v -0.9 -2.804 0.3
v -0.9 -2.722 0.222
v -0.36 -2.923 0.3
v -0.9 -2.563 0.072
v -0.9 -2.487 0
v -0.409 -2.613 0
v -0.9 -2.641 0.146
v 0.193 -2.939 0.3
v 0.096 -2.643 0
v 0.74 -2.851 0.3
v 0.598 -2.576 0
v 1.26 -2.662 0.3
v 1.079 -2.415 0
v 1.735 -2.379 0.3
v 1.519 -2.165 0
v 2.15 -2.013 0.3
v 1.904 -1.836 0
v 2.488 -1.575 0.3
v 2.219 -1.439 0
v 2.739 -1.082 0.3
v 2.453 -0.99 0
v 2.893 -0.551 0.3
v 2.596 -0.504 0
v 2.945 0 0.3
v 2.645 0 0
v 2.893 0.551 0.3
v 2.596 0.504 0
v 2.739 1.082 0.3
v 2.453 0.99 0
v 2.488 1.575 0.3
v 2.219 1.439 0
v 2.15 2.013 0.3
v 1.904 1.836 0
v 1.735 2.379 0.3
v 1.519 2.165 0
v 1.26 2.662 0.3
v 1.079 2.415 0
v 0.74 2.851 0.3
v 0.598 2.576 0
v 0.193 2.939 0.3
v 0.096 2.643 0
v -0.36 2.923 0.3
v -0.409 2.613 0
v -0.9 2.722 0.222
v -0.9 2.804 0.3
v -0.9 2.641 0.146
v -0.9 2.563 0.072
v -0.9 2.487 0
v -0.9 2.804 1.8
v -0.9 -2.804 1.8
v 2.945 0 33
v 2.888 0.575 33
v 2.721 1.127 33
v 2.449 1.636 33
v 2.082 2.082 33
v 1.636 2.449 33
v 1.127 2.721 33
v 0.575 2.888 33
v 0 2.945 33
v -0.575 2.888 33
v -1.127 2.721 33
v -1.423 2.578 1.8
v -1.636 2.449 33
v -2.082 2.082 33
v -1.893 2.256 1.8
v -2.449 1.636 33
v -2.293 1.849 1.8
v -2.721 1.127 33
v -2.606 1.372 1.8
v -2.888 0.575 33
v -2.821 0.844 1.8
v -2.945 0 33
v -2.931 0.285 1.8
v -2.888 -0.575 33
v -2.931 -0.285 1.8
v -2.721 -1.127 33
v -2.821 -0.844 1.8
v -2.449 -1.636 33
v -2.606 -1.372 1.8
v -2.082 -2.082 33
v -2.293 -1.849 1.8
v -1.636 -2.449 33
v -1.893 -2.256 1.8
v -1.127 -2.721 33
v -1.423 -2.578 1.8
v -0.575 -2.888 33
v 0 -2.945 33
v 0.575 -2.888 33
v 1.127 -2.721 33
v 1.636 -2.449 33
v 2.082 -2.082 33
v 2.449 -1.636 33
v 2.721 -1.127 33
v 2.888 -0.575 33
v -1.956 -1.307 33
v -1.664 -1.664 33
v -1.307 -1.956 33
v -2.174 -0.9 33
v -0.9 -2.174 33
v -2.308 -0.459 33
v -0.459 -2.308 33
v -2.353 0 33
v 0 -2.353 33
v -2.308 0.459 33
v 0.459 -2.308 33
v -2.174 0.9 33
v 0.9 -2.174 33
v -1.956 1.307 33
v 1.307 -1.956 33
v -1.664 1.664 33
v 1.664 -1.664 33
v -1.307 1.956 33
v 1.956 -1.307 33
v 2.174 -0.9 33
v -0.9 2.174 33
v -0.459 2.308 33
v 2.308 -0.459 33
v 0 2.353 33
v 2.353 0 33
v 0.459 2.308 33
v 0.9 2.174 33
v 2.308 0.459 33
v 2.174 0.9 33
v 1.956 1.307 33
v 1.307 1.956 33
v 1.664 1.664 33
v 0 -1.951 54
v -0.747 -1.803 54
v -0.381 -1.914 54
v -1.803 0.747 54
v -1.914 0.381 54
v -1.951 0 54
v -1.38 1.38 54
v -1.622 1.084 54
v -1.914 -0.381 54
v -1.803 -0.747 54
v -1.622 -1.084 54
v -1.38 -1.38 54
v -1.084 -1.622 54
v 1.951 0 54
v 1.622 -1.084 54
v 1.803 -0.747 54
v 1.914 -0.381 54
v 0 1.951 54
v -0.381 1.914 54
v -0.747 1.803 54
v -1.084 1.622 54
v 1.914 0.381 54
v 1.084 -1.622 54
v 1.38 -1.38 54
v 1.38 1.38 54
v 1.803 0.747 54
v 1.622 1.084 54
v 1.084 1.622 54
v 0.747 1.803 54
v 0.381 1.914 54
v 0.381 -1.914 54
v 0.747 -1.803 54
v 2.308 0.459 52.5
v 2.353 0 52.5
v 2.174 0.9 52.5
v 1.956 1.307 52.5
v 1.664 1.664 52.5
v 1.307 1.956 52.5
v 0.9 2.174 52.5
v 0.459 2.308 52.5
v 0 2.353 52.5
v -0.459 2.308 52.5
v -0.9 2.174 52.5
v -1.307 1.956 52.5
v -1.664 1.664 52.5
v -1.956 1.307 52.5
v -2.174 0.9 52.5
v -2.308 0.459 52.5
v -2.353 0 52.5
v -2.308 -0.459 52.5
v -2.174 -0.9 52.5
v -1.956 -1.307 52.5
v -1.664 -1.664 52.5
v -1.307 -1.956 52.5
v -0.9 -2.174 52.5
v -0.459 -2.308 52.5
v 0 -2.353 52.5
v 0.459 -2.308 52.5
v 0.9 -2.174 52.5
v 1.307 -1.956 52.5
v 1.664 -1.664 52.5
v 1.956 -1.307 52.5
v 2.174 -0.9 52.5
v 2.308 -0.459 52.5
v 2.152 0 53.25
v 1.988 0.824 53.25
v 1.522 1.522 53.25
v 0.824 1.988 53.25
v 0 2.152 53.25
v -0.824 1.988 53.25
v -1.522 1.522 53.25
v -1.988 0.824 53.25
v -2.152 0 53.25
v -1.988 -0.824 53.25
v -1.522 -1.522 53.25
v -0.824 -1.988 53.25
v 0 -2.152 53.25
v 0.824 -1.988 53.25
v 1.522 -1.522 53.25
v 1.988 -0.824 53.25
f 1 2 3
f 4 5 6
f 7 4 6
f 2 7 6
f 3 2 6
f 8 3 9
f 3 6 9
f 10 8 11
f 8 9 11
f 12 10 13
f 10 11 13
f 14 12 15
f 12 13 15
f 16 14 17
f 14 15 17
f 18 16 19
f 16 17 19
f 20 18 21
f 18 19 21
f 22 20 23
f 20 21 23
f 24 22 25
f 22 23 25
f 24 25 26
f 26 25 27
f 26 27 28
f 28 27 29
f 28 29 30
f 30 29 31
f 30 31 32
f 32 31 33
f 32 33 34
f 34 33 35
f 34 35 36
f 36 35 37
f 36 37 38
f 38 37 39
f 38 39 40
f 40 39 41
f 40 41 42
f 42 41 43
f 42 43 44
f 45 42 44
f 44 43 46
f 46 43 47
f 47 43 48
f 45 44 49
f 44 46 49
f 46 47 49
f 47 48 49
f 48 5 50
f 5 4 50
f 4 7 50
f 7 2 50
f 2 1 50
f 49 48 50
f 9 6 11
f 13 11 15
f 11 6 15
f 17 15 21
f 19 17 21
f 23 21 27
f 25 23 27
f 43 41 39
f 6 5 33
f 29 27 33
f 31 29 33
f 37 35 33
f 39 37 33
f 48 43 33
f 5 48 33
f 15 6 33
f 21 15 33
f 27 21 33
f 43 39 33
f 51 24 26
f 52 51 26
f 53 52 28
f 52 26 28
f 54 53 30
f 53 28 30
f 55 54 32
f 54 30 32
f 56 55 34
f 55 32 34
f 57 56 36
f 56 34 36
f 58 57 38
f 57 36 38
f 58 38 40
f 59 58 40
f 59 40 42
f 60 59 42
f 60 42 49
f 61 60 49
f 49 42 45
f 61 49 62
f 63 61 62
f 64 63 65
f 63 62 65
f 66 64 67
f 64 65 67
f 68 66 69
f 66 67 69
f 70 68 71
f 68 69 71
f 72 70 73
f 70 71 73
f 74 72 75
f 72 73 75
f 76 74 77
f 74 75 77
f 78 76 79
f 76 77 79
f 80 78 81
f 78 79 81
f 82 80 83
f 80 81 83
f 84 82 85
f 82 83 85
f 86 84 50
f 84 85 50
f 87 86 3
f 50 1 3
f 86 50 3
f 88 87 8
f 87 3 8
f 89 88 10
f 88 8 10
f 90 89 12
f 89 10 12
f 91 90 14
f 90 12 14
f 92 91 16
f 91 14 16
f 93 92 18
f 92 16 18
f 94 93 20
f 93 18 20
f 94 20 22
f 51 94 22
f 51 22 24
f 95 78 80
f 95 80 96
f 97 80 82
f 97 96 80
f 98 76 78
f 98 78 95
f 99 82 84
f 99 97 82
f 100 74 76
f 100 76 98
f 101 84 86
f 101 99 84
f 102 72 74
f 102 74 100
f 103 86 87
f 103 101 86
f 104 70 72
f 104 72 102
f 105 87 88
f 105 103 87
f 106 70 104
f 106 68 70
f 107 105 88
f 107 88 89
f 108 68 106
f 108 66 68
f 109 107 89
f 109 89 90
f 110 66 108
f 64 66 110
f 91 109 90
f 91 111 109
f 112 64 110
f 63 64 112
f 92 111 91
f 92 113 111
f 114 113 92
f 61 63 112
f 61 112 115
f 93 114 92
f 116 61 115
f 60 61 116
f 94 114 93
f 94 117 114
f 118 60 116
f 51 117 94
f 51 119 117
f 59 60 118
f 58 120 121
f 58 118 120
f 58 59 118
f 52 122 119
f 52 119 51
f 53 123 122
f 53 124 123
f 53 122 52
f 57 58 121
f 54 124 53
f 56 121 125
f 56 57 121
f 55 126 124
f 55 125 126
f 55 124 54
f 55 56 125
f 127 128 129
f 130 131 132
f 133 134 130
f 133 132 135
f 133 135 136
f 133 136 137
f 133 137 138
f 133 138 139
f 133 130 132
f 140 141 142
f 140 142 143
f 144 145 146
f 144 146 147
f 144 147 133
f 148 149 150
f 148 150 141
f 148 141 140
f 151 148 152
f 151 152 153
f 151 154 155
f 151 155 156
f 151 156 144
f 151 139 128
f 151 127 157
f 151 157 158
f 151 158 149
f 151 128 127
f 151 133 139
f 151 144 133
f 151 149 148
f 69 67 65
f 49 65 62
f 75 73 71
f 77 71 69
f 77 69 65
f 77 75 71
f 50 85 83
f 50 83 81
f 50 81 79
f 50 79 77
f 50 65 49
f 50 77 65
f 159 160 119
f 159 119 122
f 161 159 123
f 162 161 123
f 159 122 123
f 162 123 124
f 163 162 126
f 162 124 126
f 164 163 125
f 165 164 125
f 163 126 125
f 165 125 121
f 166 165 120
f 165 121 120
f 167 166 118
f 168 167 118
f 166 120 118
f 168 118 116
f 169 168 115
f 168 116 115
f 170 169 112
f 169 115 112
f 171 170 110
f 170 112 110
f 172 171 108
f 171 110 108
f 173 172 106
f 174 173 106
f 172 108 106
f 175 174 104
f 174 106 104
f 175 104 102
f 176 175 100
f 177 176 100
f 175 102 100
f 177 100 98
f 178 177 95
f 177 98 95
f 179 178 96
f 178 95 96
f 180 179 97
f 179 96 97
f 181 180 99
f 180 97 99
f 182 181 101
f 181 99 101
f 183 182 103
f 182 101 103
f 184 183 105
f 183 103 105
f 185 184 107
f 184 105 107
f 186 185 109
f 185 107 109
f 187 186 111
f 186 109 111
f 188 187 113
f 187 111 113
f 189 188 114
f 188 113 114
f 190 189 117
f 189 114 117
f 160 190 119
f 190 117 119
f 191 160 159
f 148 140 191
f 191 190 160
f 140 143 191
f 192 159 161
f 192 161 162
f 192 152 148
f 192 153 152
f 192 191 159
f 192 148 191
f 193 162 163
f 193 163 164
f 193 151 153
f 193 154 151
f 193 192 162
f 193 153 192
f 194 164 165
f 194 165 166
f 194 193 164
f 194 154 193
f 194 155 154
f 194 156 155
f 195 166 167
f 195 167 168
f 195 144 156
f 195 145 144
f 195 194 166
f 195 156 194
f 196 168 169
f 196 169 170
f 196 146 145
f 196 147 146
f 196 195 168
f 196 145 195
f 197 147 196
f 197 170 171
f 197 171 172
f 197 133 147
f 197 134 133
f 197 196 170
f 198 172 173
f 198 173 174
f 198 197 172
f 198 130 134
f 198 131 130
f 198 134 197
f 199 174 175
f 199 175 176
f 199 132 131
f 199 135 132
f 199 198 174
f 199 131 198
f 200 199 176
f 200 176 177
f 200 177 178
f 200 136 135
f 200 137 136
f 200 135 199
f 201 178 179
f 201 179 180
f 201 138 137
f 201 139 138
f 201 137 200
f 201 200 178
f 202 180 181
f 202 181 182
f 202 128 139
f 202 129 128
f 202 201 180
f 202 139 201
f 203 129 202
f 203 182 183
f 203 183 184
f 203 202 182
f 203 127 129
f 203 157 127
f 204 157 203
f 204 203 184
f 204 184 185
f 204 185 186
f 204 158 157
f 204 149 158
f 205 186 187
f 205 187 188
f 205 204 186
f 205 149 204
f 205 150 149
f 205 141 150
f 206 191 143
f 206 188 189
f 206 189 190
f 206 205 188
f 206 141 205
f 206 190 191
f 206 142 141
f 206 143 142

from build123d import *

# Parameters (mm, degrees)
F0_R     = 0.9816666667
F1_DEPTH = 11
F2_R     = 0.7843333333
F3_DEPTH = 7
F4_SIZE  = 0.1
F5_SIZE2 = 0.1339745962
F5_SIZE  = 0.5
F6_W     = 0.7
F6_H     = 0.6
F7_DEPTH = 1
F8_SCALE = 3


with BuildPart() as f1:
    # F0 (on Top) → F1 (new body)
    with BuildSketch(Plane.XY):
        Circle(F0_R)
    extrude(amount=F1_DEPTH)

    # F2 (on face) → F3 (join)
    with BuildSketch(Plane.XY.offset(11)):
        Circle(F2_R)
    extrude(amount=F3_DEPTH)

    # F4
    f4_edges = [f1.edges().sort_by_distance(p)[0] for p in [
        (-0.981667, 0, 0),
    ]]
    chamfer(f4_edges, length=F4_SIZE)

    # F5
    f5_edges = [f1.edges().sort_by_distance(p)[0] for p in [
        (-0.784333, 0, 18),
    ]]
    f5_side = f1.faces().sort_by_distance((-0.784333, 0, 14.5))[0]
    chamfer(f5_edges, length=F5_SIZE, length2=F5_SIZE2, reference=f5_side)

    # F6 (on Front) → F7 (cut, symmetric)
    with BuildSketch(Plane.XZ):
        with Locations((-0.65, 0.3)):
            Rectangle(F6_W, F6_H)
    extrude(amount=F7_DEPTH, both=True, mode=Mode.SUBTRACT)


with BuildPart() as f1_1:
    # F8: moved
    add(f1.part.scale(F8_SCALE))


solid = f1_1.part
